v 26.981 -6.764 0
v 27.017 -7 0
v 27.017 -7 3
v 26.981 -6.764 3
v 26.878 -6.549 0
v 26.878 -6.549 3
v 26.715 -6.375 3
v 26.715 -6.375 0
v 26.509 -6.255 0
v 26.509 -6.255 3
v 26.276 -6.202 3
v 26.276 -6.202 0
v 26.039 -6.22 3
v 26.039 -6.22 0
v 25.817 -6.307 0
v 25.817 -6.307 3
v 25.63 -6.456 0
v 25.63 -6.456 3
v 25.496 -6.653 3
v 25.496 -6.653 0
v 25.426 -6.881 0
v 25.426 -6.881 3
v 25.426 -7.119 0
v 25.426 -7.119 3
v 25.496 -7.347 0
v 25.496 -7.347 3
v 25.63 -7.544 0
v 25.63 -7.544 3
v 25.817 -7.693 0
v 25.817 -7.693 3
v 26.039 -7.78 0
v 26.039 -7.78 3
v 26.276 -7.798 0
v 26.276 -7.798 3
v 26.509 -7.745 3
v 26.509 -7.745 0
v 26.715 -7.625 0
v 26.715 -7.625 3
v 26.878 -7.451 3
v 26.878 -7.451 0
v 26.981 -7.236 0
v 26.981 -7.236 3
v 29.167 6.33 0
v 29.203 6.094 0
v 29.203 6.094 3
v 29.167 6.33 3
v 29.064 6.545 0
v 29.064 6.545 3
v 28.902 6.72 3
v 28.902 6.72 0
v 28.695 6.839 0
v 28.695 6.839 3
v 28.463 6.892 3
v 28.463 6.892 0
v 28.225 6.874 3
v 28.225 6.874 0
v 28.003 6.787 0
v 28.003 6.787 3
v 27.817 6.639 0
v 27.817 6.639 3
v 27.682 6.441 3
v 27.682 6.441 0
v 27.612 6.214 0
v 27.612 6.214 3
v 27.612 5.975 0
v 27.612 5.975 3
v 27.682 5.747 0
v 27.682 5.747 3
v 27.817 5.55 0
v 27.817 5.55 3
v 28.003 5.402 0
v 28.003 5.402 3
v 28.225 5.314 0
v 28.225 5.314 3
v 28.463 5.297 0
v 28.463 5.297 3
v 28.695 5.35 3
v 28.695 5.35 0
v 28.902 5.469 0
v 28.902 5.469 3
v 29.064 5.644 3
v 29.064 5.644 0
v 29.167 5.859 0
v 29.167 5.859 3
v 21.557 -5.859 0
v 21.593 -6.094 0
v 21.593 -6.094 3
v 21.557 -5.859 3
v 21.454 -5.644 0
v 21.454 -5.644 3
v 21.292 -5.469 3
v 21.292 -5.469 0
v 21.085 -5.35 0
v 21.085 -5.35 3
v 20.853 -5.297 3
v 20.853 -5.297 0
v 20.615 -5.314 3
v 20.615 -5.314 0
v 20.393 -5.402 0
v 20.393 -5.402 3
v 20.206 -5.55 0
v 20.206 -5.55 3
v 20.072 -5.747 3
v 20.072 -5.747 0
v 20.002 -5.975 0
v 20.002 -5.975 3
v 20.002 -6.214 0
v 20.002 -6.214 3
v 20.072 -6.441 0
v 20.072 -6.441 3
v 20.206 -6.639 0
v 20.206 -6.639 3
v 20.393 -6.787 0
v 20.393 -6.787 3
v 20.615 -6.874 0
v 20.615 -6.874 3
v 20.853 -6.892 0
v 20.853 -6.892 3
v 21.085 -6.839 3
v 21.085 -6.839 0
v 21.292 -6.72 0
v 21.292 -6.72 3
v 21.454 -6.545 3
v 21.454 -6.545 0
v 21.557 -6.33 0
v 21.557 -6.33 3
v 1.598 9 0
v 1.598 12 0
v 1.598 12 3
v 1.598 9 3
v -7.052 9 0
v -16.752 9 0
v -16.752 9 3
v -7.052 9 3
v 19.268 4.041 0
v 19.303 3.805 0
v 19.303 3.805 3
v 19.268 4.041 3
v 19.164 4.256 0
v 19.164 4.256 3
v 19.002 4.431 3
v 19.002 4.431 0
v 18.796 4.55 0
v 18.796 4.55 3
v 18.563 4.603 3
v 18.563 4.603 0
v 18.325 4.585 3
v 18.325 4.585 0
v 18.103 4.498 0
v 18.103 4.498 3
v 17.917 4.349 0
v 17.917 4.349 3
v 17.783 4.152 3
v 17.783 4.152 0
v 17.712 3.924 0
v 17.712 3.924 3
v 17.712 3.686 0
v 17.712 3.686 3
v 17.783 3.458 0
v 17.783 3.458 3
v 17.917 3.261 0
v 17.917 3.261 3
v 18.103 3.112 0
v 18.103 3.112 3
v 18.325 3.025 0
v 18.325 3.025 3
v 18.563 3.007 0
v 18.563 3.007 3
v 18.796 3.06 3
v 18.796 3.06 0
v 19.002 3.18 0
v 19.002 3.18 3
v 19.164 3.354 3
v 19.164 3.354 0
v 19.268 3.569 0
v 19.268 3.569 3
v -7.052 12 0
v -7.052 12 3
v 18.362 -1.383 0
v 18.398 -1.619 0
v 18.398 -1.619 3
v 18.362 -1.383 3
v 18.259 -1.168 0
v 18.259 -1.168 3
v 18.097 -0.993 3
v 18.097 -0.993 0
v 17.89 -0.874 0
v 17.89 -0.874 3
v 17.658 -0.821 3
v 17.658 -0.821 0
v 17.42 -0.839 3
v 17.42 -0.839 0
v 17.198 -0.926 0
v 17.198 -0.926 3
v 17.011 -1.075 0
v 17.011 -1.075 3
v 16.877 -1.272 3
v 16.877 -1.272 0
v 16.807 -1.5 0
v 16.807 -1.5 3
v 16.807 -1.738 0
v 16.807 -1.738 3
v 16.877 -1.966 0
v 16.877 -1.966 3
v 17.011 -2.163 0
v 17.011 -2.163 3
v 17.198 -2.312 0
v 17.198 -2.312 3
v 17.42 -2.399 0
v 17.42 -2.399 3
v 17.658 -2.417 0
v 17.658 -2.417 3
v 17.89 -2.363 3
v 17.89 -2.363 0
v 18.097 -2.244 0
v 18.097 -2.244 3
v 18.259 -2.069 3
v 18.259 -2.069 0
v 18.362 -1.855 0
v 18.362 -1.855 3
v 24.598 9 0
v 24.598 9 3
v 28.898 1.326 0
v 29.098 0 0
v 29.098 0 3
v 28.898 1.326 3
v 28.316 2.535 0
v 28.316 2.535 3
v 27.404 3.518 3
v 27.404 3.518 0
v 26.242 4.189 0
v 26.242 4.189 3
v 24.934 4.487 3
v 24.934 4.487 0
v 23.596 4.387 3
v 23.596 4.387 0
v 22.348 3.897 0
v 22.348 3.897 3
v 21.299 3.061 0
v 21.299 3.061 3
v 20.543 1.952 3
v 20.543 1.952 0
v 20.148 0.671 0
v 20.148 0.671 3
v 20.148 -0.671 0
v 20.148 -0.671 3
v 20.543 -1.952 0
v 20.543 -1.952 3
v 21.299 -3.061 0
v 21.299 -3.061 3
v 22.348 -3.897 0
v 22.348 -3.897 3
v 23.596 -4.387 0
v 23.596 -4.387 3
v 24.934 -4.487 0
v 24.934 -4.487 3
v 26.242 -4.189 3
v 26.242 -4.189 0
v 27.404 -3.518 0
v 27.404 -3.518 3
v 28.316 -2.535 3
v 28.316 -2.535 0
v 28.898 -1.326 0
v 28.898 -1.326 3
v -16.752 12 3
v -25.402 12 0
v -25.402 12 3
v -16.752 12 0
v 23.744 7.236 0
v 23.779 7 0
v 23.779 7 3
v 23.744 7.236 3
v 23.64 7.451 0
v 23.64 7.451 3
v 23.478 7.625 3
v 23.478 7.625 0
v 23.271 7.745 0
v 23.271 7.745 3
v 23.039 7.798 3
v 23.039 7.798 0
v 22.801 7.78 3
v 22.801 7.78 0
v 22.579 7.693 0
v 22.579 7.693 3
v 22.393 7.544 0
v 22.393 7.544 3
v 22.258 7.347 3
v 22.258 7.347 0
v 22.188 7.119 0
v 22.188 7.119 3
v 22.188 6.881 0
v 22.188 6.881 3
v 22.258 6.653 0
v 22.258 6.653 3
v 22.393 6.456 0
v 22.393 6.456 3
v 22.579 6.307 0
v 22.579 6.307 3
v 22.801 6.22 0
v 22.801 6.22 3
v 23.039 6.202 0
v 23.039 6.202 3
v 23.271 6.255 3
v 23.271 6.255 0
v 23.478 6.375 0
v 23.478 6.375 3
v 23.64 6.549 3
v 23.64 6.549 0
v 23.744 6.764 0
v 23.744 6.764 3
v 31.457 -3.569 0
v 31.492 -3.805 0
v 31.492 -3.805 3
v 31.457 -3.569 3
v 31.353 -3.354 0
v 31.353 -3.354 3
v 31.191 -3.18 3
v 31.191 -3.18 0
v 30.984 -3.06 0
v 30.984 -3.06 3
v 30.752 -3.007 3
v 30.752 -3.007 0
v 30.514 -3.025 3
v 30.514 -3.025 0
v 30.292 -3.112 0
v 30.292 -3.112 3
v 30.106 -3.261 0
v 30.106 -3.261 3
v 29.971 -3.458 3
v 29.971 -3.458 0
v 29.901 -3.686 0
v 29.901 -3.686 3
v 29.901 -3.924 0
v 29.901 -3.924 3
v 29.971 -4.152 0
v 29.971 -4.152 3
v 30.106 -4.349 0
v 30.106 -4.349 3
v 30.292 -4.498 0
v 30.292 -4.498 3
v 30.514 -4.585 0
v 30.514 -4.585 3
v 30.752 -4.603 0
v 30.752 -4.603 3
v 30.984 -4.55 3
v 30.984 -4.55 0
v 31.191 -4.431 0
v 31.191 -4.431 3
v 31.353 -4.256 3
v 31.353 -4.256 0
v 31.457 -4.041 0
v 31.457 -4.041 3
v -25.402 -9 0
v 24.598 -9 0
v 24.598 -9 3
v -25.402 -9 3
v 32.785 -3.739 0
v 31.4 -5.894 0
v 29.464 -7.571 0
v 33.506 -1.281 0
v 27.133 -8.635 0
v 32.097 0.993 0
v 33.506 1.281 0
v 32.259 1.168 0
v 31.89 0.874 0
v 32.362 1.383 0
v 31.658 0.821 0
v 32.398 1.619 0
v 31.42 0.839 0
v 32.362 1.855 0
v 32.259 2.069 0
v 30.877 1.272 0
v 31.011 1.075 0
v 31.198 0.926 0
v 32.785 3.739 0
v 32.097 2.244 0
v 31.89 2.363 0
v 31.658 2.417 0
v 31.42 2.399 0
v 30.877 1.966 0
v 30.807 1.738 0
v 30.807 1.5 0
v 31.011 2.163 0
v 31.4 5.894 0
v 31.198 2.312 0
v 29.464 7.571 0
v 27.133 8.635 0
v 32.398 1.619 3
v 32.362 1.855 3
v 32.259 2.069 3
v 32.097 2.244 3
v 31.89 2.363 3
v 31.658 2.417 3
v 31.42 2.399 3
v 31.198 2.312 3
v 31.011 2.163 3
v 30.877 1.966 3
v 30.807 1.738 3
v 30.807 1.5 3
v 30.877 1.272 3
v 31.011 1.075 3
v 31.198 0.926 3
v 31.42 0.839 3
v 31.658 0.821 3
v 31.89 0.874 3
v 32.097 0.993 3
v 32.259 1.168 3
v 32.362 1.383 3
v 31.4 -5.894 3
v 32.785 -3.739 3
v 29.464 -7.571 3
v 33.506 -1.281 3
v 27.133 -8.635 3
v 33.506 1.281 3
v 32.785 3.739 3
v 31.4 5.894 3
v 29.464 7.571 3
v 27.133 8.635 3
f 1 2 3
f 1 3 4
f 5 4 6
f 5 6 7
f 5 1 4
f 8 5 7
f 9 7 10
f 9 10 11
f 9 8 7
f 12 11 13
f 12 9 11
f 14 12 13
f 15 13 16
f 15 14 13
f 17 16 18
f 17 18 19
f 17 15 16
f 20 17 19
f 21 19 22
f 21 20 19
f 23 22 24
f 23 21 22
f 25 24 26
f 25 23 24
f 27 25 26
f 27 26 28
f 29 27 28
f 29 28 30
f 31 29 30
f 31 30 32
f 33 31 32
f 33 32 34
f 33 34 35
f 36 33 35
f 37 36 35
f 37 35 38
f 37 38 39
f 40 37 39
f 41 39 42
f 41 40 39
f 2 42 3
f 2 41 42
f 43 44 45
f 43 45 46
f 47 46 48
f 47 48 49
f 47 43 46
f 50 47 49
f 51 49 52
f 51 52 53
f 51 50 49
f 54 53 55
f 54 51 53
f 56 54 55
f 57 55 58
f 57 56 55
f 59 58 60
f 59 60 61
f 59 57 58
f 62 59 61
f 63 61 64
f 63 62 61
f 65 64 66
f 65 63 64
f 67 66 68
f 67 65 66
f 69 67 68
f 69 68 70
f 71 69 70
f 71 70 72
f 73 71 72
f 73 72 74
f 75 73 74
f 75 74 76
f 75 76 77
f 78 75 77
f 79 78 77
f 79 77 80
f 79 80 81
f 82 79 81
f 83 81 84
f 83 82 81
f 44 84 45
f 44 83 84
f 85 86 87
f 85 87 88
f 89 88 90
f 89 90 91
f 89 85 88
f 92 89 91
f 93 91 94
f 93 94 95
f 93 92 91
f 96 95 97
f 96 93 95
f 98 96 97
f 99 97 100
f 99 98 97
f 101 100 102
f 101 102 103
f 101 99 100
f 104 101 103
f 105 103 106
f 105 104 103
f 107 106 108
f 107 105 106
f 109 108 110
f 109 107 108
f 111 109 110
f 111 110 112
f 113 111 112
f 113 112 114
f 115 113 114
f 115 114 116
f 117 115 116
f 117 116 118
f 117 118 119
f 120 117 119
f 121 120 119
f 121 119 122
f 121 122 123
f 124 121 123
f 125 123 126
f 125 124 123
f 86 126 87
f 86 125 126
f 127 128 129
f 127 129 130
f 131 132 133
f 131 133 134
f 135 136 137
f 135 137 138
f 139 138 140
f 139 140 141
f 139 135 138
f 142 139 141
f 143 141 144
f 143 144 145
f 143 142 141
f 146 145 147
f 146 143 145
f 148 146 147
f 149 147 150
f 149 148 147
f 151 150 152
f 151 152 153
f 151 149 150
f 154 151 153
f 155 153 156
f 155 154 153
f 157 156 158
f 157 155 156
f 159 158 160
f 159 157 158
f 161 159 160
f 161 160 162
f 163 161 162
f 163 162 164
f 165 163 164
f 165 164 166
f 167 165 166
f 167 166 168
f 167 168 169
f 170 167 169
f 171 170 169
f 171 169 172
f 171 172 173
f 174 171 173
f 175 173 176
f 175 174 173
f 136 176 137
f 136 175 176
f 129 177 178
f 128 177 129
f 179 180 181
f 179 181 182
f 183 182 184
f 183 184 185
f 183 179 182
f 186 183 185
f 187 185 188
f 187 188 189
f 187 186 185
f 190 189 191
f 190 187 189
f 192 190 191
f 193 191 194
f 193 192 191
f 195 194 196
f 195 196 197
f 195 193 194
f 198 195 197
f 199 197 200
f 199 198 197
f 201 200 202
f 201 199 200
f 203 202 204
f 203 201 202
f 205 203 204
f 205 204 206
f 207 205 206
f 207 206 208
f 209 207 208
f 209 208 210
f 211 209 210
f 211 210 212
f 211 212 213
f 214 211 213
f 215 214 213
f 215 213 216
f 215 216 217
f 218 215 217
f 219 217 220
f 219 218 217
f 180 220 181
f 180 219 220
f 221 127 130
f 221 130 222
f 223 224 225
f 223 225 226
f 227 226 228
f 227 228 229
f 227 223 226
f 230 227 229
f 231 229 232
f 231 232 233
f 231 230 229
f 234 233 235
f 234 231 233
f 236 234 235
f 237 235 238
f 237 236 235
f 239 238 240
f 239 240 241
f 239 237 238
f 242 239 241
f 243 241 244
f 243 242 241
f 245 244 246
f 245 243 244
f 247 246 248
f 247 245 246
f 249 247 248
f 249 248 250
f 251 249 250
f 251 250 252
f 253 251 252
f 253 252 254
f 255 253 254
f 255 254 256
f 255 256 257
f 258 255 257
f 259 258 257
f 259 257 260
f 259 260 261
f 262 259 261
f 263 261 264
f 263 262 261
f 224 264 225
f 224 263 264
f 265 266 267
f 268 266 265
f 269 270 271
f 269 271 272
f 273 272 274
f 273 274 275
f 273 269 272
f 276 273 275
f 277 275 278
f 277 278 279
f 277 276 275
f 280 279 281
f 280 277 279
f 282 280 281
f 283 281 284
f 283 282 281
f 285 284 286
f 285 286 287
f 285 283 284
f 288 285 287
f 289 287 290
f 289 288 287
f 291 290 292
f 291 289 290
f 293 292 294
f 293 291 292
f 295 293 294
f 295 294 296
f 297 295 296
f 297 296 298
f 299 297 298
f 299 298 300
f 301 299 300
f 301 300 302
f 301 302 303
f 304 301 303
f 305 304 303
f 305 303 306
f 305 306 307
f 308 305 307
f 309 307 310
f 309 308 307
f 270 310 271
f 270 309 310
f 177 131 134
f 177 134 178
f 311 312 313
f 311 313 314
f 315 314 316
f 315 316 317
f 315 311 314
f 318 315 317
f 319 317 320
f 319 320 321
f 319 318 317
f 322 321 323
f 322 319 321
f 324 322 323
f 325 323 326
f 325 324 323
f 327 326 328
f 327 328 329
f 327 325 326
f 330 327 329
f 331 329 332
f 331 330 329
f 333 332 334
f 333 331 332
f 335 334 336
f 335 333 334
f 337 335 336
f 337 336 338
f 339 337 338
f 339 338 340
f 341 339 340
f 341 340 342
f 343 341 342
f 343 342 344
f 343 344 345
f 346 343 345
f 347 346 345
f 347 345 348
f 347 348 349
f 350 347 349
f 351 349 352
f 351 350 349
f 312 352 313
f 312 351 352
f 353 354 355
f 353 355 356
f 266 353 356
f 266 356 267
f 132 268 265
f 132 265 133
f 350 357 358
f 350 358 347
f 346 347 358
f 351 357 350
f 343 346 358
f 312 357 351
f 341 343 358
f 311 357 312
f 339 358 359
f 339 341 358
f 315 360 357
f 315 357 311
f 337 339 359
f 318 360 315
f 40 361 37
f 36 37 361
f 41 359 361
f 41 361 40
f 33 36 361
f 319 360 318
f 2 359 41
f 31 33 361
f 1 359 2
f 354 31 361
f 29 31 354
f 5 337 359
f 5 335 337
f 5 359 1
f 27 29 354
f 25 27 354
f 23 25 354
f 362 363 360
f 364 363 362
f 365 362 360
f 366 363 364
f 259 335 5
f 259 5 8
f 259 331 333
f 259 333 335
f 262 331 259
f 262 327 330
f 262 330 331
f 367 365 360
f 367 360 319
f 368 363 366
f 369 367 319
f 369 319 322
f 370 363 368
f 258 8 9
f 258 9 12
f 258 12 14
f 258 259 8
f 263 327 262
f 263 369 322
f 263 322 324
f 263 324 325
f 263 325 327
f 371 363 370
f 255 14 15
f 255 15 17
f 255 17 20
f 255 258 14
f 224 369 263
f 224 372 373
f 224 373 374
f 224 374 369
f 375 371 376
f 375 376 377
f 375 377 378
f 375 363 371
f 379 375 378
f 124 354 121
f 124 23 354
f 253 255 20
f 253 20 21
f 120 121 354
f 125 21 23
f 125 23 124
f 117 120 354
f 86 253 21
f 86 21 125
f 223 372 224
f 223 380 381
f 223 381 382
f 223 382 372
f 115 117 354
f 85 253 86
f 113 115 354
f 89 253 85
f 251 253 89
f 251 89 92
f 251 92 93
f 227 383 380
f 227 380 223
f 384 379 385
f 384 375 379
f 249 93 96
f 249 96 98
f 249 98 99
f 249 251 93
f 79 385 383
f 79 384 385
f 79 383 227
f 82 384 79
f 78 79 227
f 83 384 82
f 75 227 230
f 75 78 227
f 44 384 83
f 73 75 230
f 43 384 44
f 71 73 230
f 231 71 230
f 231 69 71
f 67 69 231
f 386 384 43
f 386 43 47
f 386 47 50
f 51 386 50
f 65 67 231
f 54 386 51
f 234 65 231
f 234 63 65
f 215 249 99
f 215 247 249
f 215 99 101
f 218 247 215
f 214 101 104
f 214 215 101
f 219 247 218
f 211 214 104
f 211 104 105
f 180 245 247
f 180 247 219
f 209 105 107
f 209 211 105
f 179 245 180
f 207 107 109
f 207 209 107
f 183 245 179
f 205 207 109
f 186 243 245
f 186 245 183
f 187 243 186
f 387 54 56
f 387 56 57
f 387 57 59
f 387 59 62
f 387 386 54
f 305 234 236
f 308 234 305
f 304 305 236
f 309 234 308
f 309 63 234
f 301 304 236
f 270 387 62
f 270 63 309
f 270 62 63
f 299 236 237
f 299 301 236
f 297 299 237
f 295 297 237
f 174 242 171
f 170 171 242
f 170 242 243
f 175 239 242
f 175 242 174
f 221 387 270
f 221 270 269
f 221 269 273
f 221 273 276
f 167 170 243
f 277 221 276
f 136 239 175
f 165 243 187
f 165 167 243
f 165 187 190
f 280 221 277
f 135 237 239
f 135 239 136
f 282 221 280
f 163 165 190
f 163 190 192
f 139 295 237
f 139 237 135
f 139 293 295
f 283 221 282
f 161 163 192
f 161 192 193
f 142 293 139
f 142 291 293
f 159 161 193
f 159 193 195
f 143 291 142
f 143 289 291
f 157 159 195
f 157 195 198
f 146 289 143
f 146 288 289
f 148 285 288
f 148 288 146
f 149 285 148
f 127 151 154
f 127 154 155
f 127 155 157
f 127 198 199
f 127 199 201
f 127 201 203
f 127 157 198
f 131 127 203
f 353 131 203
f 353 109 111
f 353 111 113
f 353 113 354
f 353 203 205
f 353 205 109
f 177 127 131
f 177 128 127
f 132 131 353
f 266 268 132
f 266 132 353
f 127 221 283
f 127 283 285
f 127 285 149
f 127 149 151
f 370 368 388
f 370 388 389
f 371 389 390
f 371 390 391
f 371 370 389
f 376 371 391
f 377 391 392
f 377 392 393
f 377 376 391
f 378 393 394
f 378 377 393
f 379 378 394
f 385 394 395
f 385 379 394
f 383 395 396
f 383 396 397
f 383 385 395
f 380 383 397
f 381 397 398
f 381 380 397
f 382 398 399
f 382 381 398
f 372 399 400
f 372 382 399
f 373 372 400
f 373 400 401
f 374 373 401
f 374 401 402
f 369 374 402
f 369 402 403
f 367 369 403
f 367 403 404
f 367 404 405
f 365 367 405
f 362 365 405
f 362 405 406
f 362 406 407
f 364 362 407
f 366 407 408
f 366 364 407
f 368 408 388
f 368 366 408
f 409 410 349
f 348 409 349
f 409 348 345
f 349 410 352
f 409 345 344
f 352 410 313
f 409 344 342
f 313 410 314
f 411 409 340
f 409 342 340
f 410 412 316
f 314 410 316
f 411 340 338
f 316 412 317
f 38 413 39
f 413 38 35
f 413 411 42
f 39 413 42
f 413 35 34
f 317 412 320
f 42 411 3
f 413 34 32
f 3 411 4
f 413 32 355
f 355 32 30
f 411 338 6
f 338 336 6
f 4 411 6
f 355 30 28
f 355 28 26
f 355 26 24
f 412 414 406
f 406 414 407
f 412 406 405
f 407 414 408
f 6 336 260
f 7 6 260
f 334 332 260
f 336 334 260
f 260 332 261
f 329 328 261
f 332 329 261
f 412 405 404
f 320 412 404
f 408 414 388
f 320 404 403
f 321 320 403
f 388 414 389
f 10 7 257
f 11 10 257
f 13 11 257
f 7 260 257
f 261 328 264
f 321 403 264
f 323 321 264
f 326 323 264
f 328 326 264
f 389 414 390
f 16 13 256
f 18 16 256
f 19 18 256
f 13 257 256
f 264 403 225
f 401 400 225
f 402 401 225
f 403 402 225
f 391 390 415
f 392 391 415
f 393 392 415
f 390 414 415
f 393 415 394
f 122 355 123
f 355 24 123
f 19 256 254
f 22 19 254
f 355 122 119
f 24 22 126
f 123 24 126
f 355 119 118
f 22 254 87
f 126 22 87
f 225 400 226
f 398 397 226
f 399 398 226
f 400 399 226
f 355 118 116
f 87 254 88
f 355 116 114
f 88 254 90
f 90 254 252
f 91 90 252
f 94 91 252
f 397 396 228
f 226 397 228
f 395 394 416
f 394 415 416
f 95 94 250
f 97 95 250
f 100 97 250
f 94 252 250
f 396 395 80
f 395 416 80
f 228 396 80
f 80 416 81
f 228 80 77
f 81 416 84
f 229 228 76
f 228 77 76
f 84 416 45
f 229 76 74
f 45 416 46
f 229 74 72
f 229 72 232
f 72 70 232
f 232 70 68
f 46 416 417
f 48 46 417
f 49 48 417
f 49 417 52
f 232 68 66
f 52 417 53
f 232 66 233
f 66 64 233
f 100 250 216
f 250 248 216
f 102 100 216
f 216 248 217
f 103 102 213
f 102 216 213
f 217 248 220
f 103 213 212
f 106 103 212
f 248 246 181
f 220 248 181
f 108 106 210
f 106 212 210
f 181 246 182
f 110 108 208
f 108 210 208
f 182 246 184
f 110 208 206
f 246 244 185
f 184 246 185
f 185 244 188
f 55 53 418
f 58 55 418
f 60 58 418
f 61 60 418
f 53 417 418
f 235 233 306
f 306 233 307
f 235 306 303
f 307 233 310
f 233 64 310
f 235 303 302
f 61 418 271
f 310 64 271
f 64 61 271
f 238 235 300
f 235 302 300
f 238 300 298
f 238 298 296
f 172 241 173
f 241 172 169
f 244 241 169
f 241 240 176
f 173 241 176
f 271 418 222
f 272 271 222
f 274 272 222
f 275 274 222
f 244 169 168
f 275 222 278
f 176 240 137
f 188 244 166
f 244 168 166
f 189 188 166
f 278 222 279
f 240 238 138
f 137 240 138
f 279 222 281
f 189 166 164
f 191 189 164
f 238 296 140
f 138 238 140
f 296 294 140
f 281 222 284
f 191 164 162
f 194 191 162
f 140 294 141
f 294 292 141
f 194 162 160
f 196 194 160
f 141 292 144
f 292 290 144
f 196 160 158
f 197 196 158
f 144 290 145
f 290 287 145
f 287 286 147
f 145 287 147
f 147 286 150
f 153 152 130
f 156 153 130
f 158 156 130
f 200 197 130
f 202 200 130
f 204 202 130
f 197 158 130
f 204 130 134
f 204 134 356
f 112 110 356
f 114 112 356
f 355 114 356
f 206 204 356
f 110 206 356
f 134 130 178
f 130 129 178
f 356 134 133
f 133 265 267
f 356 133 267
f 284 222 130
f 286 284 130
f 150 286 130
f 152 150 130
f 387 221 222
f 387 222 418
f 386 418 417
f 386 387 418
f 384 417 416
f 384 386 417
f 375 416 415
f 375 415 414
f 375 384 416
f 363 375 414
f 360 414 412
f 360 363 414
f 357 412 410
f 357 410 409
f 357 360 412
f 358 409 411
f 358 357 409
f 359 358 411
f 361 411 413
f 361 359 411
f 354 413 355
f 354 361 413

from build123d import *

# Parameters (mm, degrees)
ESQUISSE1_R        = 4.5
ESQUISSE1_R_2      = 0.8
BOSS_EXTRU_1_DEPTH = 3


with BuildPart() as part:
    # Esquisse1 → Boss.-Extru.1 (new body)
    with BuildSketch(Plane.XY):
        with BuildLine():
            Line((1.597834667, 9), (24.597834667, 9))
            ThreePointArc((24.597834667, 9), (33.597834667, 0), (24.597834667, -9))
            Line((24.597834667, -9), (-25.402165333, -9))
            Line((-25.402165333, -9), (-25.402165333, 12))
            Line((-25.402165333, 12), (-16.752165333, 12))
            Line((-16.752165333, 12), (-16.752165333, 9))
            Line((-16.752165333, 9), (-7.052165333, 9))
            Line((-7.052165333, 9), (-7.052165333, 12))
            Line((-7.052165333, 12), (1.597834667, 12))
            Line((1.597834667, 12), (1.597834667, 9))
        make_face()
        with Locations((24.597834667, 0)):
            Circle(ESQUISSE1_R, mode=Mode.SUBTRACT)
        with Locations((22.97907079, 7)):
            Circle(ESQUISSE1_R_2, mode=Mode.SUBTRACT)
        with Locations((28.402943221, 6.094386383)):
            Circle(ESQUISSE1_R_2, mode=Mode.SUBTRACT)
        with Locations((31.597834667, 1.618763877)):
            Circle(ESQUISSE1_R_2, mode=Mode.SUBTRACT)
        with Locations((30.69222105, -3.805108554)):
            Circle(ESQUISSE1_R_2, mode=Mode.SUBTRACT)
        with Locations((26.216598544, -7)):
            Circle(ESQUISSE1_R_2, mode=Mode.SUBTRACT)
        with Locations((20.792726113, -6.094386383)):
            Circle(ESQUISSE1_R_2, mode=Mode.SUBTRACT)
        with Locations((17.597834667, -1.618763877)):
            Circle(ESQUISSE1_R_2, mode=Mode.SUBTRACT)
        with Locations((18.503448284, 3.805108554)):
            Circle(ESQUISSE1_R_2, mode=Mode.SUBTRACT)
    extrude(amount=BOSS_EXTRU_1_DEPTH)


solid = part.part
